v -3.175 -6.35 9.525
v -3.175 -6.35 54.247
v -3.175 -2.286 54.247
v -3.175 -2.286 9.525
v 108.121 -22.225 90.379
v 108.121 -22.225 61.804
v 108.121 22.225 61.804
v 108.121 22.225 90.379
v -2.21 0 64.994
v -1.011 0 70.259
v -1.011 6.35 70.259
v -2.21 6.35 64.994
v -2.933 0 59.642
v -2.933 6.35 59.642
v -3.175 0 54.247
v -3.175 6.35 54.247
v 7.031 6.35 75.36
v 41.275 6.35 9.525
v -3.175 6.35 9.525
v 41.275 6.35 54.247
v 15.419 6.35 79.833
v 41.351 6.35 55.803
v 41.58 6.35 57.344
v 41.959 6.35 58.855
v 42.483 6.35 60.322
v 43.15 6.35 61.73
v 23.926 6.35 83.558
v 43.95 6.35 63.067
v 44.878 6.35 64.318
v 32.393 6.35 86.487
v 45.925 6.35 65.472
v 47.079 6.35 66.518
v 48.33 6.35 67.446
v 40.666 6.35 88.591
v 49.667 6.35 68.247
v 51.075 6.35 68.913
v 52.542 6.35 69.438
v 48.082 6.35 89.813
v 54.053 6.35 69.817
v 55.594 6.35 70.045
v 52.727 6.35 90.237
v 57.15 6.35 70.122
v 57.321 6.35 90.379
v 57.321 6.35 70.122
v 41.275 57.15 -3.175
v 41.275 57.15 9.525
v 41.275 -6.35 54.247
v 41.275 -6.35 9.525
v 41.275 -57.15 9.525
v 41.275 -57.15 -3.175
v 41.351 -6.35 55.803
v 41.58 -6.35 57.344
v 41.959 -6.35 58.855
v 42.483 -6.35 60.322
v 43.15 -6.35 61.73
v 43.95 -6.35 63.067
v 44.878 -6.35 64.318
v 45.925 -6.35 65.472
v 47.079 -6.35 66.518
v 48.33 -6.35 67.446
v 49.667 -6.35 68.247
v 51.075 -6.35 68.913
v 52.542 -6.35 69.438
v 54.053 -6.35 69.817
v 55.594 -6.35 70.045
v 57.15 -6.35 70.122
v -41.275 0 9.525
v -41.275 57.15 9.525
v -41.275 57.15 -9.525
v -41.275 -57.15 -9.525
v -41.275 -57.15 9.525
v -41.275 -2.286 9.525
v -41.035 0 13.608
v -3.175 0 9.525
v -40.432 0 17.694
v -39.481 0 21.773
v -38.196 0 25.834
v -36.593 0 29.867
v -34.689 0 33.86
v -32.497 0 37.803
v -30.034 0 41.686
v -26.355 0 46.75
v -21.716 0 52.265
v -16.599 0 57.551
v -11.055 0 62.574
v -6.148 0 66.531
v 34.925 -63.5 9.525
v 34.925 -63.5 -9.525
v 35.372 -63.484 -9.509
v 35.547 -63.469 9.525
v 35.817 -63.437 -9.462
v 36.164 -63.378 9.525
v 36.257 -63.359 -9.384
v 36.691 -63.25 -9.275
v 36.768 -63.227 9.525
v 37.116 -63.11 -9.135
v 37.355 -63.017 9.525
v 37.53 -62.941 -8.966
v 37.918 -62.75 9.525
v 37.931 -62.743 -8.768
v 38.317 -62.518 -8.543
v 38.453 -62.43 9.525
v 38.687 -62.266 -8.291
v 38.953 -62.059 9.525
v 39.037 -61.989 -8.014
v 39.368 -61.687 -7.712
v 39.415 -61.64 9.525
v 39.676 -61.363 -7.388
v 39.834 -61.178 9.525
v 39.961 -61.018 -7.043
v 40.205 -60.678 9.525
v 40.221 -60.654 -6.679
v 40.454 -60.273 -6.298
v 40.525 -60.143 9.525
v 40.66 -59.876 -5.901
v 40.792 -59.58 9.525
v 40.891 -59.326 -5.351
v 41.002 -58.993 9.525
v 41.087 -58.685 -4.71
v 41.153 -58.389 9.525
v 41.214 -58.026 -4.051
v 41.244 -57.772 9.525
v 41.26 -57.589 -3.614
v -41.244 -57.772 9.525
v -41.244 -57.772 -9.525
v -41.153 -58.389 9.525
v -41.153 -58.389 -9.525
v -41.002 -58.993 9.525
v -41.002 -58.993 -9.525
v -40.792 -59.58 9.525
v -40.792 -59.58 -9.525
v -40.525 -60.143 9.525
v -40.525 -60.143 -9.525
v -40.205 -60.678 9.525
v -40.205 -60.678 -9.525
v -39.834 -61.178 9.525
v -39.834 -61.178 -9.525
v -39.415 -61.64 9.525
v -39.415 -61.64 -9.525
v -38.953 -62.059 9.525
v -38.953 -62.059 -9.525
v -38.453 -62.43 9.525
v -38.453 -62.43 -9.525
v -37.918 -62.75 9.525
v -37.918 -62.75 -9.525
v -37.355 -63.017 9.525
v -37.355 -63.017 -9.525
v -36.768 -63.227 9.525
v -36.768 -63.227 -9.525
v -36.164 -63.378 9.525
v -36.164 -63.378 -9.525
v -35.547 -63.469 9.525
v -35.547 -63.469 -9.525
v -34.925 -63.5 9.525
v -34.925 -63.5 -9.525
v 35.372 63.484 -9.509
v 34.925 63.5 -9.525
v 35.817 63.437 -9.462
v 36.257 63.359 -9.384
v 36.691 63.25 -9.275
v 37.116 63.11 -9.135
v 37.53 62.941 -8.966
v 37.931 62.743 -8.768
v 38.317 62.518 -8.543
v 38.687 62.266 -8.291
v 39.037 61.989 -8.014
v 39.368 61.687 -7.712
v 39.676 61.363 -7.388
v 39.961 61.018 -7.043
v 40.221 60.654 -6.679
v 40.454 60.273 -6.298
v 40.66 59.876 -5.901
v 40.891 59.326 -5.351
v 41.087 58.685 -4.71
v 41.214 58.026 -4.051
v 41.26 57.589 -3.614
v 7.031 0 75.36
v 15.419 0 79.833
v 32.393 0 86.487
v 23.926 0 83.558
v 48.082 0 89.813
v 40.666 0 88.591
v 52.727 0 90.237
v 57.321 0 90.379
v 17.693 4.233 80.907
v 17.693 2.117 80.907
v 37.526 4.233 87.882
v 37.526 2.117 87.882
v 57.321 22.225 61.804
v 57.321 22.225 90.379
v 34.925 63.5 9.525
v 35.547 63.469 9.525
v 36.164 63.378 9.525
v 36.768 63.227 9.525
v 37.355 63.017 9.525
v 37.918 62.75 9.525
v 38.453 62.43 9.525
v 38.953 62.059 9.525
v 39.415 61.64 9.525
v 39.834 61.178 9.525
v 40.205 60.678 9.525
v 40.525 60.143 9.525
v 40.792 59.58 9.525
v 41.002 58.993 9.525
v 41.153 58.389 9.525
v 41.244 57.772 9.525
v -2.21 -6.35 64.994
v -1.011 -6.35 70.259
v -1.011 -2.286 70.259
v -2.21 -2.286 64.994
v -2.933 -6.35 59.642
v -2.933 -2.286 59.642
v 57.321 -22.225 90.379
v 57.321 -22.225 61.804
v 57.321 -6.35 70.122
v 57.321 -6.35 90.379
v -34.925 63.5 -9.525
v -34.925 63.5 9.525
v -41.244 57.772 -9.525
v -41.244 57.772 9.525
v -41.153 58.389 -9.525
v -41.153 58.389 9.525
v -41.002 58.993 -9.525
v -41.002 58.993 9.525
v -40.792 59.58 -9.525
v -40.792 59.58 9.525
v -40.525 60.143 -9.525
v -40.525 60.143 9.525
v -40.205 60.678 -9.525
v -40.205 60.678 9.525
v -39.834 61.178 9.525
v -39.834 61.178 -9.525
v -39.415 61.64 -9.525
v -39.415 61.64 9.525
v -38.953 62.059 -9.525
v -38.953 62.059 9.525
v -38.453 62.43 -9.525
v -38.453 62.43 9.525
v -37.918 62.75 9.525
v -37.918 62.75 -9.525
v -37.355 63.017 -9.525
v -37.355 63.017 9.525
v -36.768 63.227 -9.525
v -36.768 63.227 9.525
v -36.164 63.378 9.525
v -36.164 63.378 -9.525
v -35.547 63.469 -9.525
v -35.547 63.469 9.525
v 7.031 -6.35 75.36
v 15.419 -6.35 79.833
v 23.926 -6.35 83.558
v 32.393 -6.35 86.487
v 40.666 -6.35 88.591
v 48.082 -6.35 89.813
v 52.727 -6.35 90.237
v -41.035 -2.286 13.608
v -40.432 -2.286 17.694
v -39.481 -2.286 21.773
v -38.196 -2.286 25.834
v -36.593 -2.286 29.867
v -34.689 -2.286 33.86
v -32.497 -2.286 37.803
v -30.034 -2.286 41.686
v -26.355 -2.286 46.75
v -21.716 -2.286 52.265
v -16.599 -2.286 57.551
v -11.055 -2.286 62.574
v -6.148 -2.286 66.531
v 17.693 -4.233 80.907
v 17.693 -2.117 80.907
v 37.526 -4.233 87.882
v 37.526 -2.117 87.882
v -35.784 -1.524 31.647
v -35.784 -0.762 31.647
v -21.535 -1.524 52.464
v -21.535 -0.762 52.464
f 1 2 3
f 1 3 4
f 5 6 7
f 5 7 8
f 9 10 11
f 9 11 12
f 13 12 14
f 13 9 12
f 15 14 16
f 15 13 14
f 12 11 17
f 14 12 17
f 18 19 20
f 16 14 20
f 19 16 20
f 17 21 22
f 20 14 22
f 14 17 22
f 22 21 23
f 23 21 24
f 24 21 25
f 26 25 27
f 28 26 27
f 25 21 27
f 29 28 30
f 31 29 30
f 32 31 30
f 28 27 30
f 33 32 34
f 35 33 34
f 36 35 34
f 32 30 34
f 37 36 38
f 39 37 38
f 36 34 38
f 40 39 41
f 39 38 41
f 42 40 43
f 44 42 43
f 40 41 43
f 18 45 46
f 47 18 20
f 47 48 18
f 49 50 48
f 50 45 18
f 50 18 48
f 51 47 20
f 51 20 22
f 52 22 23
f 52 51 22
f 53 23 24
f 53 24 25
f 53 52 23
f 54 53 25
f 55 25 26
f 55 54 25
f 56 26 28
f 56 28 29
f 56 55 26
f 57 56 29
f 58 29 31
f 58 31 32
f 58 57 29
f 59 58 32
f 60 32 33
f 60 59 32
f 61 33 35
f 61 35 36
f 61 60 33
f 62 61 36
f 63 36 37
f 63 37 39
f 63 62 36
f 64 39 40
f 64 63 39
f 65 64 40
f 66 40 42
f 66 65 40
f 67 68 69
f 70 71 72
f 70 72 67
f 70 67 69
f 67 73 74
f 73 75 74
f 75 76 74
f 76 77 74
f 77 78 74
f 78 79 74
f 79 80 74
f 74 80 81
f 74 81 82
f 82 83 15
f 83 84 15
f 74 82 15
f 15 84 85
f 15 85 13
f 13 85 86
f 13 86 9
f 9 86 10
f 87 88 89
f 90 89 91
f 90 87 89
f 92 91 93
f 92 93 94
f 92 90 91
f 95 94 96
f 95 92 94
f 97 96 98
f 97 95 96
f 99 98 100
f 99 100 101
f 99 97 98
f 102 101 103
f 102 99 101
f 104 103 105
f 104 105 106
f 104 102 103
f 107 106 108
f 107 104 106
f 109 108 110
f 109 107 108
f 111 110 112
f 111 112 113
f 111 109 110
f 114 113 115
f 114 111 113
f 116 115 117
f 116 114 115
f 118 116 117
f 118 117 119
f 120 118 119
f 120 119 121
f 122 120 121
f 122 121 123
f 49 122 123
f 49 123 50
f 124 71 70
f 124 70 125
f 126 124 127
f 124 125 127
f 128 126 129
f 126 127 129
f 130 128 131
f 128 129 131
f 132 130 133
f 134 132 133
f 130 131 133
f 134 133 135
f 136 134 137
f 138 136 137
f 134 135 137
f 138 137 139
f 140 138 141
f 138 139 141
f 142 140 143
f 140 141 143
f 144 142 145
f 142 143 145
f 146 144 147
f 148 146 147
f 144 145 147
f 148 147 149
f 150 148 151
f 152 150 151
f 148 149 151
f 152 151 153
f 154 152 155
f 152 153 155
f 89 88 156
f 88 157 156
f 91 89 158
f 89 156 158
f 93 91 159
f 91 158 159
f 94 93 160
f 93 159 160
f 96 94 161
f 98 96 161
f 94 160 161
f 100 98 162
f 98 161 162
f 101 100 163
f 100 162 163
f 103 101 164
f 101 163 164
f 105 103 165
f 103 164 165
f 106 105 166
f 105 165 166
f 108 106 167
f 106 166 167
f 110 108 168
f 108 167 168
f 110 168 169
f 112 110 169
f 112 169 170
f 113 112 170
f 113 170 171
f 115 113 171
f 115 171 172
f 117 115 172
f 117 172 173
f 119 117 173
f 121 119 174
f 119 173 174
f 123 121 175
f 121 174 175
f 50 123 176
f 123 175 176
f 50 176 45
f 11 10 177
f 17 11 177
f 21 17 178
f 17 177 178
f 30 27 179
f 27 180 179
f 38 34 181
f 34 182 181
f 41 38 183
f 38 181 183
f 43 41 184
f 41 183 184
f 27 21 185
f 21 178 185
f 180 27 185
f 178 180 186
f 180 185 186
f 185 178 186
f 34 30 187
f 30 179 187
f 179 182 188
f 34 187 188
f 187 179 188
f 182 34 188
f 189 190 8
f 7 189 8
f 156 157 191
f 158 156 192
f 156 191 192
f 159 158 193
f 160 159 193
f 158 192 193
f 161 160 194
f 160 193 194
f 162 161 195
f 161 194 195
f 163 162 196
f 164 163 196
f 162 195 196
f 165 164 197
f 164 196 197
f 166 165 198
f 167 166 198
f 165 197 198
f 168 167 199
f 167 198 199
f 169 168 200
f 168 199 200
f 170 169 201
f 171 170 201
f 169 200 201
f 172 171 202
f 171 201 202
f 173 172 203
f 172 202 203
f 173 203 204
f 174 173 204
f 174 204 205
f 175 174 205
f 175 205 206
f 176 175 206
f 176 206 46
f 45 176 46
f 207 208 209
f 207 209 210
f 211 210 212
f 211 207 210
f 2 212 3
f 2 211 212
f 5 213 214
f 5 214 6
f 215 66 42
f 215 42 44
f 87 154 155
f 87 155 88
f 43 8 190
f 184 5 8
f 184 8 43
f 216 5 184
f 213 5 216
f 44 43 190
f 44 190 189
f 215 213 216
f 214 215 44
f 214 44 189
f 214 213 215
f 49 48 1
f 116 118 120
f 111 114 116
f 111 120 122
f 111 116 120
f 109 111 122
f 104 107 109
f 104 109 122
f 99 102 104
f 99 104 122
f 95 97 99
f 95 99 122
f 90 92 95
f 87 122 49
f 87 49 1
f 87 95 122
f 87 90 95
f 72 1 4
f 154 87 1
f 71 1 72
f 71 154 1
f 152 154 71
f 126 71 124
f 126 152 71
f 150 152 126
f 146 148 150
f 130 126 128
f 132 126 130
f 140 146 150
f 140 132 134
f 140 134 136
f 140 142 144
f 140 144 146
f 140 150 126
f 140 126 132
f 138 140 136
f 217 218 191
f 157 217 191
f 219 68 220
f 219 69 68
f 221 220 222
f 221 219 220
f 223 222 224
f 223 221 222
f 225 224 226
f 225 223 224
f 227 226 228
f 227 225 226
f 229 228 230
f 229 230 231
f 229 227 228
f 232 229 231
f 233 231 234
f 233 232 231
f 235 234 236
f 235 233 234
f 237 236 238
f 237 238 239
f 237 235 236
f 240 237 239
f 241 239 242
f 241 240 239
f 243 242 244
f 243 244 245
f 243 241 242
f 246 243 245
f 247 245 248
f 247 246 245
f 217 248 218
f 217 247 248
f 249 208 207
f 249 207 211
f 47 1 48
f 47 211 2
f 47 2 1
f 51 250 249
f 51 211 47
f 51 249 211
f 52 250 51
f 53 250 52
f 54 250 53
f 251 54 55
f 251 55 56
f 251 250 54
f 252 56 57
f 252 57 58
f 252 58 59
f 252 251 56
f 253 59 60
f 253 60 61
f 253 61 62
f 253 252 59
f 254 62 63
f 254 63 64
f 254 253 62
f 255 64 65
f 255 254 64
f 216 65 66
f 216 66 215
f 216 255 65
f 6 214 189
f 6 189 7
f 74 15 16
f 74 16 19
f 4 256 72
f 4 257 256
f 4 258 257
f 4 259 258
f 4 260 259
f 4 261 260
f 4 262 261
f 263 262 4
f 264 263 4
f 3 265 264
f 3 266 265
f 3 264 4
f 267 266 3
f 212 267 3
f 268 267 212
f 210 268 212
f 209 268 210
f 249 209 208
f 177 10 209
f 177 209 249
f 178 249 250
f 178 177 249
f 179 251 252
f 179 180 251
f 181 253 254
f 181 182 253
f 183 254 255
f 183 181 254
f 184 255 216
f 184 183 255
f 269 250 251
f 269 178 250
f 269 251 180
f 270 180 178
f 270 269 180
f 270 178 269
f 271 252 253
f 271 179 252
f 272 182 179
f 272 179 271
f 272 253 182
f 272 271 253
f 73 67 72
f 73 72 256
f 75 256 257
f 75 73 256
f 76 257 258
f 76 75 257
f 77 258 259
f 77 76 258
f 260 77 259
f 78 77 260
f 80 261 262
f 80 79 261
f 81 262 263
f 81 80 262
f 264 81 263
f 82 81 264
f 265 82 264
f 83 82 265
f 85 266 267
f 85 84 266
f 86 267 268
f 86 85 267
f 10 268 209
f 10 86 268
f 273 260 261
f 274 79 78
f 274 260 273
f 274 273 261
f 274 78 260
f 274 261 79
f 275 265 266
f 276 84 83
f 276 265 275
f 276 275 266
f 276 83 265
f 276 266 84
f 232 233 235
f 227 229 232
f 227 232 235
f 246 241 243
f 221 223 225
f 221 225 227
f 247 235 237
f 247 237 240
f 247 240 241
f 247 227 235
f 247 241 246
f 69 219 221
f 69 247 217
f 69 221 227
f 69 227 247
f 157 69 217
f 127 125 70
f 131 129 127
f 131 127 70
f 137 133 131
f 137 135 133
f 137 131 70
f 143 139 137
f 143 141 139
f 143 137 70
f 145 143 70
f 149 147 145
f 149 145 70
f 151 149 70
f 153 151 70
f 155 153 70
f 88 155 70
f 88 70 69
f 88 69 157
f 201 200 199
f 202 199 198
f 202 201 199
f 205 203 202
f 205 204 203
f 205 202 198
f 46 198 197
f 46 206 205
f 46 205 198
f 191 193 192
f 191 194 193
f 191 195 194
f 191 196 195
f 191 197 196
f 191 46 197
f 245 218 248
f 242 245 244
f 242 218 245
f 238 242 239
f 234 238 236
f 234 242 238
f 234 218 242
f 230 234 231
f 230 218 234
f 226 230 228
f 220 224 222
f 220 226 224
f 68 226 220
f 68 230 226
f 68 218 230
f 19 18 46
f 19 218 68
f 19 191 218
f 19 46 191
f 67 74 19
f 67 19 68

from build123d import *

# Parameters (mm, degrees)
F1_DEPTH = 63.5
F2_DEPTH = 6.35
F3_DEPTH = 22.225
F4_DEPTH = 2.286
F5_R     = 6.35


with BuildPart() as f1:
    # F0 (on Front) → F1 (new body, symmetric)
    with BuildSketch(Plane.XZ):
        Polygon((41.275, -9.525), (41.275, 9.525), (-3.175, 9.525), (-41.275, 9.525), (-41.275, -9.525), align=None)
    extrude(amount=F1_DEPTH, both=True)

    # F0 (on Front) → F2 (join, symmetric)
    with BuildSketch(Plane.XZ):
        with BuildLine():
            Line((-3.175, 9.525), (41.275, 9.525))
            Line((41.275, 9.525), (41.275, 54.246902))
            ThreePointArc((41.275, 54.246902), (45.92468, 65.472222), (57.15, 70.121902))
            Line((57.15, 70.121902), (57.320657, 70.121902))
            Line((57.320657, 70.121902), (57.320657, 90.37864))
            add(Edge.make_bspline(
                [(-1.011012, 70.259469), (16.740772, 82.473388), (37.932847, 90.39046), (57.320657, 90.37864)],
                knots=[71.739647, 71.739647, 71.739647, 71.739647, 127.508489, 127.508489, 127.508489, 127.508489], degree=3))
            ThreePointArc((-1.011012, 70.259469), (-2.631555, 62.325967), (-3.175, 54.246902))
            Line((-3.175, 54.246902), (-3.175, 9.525))
        make_face()
    extrude(amount=F2_DEPTH, both=True)

    # F0 (on Front) → F3 (join, symmetric)
    with BuildSketch(Plane.XZ):
        Polygon((57.320657, 90.37864), (57.320657, 70.121902), (57.320657, 61.80364), (108.120657, 61.80364), (108.120657, 90.37864), align=None)
    extrude(amount=F3_DEPTH, both=True)

    # F0 (on Front) → F4 (join)
    with BuildSketch(Plane.XZ):
        with BuildLine():
            Line((-41.275, 9.525), (-3.175, 9.525))
            Line((-3.175, 9.525), (-3.175, 54.246902))
            ThreePointArc((-3.175, 54.246902), (-2.631555, 62.325967), (-1.011012, 70.259469))
            add(Edge.make_bspline(
                [(-41.275, 9.525), (-40.989055, 31.725856), (-23.846463, 54.547789), (-1.011012, 70.259469)],
                knots=[0, 0, 0, 0, 71.739647, 71.739647, 71.739647, 71.739647], degree=3))
        make_face()
    extrude(amount=F4_DEPTH)

    # F5
    f5_edges = [f1.edges().sort_by_distance(p)[0] for p in [
        (41.275, 63.5, 0),
        (-41.275, 63.5, 0),
        (41.275, -63.5, 0),
        (-41.275, -63.5, 0),
        (41.275, 0, -9.525),
    ]]
    fillet(f5_edges, radius=F5_R)


solid = f1.part
